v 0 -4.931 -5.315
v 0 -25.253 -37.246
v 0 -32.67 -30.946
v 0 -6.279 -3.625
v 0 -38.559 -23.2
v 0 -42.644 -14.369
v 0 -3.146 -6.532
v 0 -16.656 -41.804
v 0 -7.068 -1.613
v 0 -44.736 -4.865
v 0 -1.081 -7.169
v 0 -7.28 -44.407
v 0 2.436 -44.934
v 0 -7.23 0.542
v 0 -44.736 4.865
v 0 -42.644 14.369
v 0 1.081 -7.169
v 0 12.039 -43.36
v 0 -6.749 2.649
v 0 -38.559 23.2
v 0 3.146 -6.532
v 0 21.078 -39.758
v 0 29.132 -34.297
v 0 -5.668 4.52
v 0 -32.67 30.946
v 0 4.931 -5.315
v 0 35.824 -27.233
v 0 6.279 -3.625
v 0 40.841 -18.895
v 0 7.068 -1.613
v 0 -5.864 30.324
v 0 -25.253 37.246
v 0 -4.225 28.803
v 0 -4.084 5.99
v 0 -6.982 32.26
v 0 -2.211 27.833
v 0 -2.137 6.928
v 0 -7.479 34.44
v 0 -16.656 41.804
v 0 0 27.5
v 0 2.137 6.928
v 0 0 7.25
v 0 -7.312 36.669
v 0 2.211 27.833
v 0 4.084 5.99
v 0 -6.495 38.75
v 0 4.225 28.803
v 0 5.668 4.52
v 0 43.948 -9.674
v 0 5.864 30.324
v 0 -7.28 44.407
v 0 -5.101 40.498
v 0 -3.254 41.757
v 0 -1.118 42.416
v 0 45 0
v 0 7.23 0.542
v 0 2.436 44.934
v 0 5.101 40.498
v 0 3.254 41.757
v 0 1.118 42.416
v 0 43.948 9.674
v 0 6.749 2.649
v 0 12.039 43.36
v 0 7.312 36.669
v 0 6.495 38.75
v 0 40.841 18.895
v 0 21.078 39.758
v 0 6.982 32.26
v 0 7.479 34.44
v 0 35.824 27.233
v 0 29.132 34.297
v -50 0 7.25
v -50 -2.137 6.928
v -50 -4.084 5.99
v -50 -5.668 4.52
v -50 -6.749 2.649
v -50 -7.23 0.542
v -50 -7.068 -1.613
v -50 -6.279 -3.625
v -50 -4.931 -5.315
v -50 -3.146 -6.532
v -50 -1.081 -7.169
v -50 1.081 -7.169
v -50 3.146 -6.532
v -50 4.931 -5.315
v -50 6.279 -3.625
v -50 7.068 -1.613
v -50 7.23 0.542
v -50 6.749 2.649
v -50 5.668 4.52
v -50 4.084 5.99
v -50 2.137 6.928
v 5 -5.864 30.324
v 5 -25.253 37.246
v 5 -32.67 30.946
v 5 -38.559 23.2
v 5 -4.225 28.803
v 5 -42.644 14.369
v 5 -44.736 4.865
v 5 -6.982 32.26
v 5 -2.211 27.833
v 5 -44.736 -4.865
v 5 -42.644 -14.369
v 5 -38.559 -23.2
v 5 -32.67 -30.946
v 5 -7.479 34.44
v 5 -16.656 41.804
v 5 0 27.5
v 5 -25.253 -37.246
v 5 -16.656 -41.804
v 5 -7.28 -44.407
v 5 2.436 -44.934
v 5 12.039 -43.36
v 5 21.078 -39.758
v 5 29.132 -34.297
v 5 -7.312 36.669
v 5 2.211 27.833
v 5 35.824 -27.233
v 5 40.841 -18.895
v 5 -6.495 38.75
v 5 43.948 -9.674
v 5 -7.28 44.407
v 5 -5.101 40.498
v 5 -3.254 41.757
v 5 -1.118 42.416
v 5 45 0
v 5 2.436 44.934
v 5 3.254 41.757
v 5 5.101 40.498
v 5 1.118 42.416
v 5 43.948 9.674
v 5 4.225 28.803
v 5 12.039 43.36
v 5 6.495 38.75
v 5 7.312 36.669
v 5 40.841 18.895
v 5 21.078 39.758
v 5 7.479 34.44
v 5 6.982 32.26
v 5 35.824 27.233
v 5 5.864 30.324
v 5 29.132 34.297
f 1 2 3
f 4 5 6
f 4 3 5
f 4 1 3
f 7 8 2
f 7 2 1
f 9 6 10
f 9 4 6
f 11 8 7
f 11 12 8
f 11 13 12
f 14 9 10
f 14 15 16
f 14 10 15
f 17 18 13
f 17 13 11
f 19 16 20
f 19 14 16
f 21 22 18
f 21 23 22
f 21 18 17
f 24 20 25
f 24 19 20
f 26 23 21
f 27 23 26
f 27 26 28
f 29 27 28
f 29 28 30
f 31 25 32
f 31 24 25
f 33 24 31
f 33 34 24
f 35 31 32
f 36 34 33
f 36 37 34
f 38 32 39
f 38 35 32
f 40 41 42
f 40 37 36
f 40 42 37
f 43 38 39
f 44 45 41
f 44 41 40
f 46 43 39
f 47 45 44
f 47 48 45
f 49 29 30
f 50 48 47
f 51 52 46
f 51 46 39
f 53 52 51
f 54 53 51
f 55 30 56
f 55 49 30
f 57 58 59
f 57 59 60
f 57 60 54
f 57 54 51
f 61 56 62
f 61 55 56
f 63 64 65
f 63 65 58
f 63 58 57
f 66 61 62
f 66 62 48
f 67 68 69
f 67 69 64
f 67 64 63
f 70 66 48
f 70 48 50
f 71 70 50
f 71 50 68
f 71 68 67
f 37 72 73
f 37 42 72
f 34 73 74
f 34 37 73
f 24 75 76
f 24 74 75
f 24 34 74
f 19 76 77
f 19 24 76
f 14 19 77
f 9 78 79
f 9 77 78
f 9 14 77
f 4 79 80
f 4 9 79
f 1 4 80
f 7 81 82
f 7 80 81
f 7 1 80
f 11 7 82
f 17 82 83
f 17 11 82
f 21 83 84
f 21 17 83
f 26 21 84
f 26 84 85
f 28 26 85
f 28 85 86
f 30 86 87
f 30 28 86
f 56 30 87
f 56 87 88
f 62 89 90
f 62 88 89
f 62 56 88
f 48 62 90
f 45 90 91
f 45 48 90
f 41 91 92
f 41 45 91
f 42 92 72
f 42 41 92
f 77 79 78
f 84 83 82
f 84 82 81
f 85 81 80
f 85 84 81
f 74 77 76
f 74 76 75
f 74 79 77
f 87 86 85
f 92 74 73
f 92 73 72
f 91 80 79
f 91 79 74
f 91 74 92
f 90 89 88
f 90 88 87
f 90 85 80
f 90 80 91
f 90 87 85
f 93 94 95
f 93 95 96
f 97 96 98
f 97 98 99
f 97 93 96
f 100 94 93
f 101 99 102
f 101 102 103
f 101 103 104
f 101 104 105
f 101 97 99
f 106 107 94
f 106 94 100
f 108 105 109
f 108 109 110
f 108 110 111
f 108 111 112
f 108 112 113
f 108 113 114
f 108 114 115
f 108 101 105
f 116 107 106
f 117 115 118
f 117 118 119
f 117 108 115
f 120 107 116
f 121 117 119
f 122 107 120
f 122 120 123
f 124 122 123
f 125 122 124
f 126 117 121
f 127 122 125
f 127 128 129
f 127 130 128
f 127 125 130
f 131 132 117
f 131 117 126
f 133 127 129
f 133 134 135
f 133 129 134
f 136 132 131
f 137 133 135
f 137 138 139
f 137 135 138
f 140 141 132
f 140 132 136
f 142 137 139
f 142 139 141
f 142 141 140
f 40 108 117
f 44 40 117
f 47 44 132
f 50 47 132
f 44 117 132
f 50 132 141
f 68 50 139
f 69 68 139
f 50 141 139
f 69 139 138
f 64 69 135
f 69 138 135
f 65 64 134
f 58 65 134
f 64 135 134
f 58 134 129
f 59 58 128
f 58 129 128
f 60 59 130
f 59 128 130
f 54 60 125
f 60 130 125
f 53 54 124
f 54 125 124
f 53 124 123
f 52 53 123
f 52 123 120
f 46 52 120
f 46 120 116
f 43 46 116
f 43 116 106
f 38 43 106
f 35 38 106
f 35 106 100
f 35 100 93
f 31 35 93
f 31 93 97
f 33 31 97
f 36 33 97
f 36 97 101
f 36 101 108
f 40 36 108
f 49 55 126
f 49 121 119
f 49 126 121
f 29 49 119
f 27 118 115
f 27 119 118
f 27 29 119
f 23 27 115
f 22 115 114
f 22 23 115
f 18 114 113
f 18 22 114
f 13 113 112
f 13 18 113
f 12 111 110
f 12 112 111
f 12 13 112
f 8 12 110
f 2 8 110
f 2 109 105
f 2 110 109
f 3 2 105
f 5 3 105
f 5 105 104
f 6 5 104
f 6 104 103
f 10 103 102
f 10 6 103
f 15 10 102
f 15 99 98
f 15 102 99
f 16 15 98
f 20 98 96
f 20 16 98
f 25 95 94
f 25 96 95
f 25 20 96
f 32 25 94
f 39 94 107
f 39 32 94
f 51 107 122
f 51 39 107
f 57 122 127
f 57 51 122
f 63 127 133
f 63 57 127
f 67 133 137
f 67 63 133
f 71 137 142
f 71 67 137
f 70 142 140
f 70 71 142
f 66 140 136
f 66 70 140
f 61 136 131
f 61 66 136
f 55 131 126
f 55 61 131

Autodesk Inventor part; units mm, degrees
ref_plane "YZ Plane" through (0, 0, 0) normal (1, 0, 0) x (0, 1, 0)
ref_plane "XZ Plane" through (0, 0, 0) normal (0, 1, 0) x (-1, 0, 0)
ref_plane "XY Plane" through (0, 0, 0) normal (0, 0, 1) x (1, 0, 0)
sketch "Sketch1" plane through (0, 0, 0) normal (1, 0, 0) x (0, 1, 0)
  circle A0 centre (0, 0) radius 45
  circle A1 centre (0, 0) radius 7.5
  dimension "d0" = 90
  dimension "d1" = 15
extrude "Extrusion1" add sketch "Sketch1" along normal blind 5
sketch "Sketch2" plane through (5, 0, 0) normal (1, 0, 0) x (0, 0, -1)
  line L0 (0, 0) -> (-35, 0)
  circle A0 centre (-35, 0) radius 7.5
  dimension "d6" = 35
  dimension "d7" = 15
extrude "Extrusion2" cut sketch "Sketch2" against normal blind 5
sketch "Sketch3" plane through (5, 0, 0) normal (1, 0, 0) x (0, 0, -1)
  point P0 (0, 0)
sketch "Sketch4" plane through (0, 0, 0) normal (-1, 0, 0) x (0, 0, 1)
  circle A0 centre (0, 0) radius 7.5 projected
  circle A1 centre (0, 0) radius 7.5
extrude "Extrusion3" add sketch "Sketch4" against normal blind 5
sketch "Sketch5" plane through (5, 0, 0) normal (1, 0, 0) x (0, 0, -1)
  point P0 (0, 0)
sketch "Sketch6" plane through (0, 0, 0) normal (-1, 0, 0) x (0, 0, 1)
  circle A0 centre (0, 0) radius 7.25
  dimension "d12" = 14.5
extrude "Extrusion4" add sketch "Sketch6" along normal blind 50
equation "\"BendRadius\" = Thickness"
equation "\"BendReliefWidth\" = Thickness"
equation "\"BendReliefDepth\" = 0.5 * Thickness"
equation "\"CornerReliefSize\" = 4 * Thickness"
equation "\"MinimumRemnant\" = 2 * Thickness"
equation "\"TransitionRadius\" = BendRadius"
equation "\"JacobiRadiusSize\" = BendRadius"
equation "\"GapSize\" = Thickness"
equation "\"Thickness\" = 0.5"
properties part number "Manivela"
